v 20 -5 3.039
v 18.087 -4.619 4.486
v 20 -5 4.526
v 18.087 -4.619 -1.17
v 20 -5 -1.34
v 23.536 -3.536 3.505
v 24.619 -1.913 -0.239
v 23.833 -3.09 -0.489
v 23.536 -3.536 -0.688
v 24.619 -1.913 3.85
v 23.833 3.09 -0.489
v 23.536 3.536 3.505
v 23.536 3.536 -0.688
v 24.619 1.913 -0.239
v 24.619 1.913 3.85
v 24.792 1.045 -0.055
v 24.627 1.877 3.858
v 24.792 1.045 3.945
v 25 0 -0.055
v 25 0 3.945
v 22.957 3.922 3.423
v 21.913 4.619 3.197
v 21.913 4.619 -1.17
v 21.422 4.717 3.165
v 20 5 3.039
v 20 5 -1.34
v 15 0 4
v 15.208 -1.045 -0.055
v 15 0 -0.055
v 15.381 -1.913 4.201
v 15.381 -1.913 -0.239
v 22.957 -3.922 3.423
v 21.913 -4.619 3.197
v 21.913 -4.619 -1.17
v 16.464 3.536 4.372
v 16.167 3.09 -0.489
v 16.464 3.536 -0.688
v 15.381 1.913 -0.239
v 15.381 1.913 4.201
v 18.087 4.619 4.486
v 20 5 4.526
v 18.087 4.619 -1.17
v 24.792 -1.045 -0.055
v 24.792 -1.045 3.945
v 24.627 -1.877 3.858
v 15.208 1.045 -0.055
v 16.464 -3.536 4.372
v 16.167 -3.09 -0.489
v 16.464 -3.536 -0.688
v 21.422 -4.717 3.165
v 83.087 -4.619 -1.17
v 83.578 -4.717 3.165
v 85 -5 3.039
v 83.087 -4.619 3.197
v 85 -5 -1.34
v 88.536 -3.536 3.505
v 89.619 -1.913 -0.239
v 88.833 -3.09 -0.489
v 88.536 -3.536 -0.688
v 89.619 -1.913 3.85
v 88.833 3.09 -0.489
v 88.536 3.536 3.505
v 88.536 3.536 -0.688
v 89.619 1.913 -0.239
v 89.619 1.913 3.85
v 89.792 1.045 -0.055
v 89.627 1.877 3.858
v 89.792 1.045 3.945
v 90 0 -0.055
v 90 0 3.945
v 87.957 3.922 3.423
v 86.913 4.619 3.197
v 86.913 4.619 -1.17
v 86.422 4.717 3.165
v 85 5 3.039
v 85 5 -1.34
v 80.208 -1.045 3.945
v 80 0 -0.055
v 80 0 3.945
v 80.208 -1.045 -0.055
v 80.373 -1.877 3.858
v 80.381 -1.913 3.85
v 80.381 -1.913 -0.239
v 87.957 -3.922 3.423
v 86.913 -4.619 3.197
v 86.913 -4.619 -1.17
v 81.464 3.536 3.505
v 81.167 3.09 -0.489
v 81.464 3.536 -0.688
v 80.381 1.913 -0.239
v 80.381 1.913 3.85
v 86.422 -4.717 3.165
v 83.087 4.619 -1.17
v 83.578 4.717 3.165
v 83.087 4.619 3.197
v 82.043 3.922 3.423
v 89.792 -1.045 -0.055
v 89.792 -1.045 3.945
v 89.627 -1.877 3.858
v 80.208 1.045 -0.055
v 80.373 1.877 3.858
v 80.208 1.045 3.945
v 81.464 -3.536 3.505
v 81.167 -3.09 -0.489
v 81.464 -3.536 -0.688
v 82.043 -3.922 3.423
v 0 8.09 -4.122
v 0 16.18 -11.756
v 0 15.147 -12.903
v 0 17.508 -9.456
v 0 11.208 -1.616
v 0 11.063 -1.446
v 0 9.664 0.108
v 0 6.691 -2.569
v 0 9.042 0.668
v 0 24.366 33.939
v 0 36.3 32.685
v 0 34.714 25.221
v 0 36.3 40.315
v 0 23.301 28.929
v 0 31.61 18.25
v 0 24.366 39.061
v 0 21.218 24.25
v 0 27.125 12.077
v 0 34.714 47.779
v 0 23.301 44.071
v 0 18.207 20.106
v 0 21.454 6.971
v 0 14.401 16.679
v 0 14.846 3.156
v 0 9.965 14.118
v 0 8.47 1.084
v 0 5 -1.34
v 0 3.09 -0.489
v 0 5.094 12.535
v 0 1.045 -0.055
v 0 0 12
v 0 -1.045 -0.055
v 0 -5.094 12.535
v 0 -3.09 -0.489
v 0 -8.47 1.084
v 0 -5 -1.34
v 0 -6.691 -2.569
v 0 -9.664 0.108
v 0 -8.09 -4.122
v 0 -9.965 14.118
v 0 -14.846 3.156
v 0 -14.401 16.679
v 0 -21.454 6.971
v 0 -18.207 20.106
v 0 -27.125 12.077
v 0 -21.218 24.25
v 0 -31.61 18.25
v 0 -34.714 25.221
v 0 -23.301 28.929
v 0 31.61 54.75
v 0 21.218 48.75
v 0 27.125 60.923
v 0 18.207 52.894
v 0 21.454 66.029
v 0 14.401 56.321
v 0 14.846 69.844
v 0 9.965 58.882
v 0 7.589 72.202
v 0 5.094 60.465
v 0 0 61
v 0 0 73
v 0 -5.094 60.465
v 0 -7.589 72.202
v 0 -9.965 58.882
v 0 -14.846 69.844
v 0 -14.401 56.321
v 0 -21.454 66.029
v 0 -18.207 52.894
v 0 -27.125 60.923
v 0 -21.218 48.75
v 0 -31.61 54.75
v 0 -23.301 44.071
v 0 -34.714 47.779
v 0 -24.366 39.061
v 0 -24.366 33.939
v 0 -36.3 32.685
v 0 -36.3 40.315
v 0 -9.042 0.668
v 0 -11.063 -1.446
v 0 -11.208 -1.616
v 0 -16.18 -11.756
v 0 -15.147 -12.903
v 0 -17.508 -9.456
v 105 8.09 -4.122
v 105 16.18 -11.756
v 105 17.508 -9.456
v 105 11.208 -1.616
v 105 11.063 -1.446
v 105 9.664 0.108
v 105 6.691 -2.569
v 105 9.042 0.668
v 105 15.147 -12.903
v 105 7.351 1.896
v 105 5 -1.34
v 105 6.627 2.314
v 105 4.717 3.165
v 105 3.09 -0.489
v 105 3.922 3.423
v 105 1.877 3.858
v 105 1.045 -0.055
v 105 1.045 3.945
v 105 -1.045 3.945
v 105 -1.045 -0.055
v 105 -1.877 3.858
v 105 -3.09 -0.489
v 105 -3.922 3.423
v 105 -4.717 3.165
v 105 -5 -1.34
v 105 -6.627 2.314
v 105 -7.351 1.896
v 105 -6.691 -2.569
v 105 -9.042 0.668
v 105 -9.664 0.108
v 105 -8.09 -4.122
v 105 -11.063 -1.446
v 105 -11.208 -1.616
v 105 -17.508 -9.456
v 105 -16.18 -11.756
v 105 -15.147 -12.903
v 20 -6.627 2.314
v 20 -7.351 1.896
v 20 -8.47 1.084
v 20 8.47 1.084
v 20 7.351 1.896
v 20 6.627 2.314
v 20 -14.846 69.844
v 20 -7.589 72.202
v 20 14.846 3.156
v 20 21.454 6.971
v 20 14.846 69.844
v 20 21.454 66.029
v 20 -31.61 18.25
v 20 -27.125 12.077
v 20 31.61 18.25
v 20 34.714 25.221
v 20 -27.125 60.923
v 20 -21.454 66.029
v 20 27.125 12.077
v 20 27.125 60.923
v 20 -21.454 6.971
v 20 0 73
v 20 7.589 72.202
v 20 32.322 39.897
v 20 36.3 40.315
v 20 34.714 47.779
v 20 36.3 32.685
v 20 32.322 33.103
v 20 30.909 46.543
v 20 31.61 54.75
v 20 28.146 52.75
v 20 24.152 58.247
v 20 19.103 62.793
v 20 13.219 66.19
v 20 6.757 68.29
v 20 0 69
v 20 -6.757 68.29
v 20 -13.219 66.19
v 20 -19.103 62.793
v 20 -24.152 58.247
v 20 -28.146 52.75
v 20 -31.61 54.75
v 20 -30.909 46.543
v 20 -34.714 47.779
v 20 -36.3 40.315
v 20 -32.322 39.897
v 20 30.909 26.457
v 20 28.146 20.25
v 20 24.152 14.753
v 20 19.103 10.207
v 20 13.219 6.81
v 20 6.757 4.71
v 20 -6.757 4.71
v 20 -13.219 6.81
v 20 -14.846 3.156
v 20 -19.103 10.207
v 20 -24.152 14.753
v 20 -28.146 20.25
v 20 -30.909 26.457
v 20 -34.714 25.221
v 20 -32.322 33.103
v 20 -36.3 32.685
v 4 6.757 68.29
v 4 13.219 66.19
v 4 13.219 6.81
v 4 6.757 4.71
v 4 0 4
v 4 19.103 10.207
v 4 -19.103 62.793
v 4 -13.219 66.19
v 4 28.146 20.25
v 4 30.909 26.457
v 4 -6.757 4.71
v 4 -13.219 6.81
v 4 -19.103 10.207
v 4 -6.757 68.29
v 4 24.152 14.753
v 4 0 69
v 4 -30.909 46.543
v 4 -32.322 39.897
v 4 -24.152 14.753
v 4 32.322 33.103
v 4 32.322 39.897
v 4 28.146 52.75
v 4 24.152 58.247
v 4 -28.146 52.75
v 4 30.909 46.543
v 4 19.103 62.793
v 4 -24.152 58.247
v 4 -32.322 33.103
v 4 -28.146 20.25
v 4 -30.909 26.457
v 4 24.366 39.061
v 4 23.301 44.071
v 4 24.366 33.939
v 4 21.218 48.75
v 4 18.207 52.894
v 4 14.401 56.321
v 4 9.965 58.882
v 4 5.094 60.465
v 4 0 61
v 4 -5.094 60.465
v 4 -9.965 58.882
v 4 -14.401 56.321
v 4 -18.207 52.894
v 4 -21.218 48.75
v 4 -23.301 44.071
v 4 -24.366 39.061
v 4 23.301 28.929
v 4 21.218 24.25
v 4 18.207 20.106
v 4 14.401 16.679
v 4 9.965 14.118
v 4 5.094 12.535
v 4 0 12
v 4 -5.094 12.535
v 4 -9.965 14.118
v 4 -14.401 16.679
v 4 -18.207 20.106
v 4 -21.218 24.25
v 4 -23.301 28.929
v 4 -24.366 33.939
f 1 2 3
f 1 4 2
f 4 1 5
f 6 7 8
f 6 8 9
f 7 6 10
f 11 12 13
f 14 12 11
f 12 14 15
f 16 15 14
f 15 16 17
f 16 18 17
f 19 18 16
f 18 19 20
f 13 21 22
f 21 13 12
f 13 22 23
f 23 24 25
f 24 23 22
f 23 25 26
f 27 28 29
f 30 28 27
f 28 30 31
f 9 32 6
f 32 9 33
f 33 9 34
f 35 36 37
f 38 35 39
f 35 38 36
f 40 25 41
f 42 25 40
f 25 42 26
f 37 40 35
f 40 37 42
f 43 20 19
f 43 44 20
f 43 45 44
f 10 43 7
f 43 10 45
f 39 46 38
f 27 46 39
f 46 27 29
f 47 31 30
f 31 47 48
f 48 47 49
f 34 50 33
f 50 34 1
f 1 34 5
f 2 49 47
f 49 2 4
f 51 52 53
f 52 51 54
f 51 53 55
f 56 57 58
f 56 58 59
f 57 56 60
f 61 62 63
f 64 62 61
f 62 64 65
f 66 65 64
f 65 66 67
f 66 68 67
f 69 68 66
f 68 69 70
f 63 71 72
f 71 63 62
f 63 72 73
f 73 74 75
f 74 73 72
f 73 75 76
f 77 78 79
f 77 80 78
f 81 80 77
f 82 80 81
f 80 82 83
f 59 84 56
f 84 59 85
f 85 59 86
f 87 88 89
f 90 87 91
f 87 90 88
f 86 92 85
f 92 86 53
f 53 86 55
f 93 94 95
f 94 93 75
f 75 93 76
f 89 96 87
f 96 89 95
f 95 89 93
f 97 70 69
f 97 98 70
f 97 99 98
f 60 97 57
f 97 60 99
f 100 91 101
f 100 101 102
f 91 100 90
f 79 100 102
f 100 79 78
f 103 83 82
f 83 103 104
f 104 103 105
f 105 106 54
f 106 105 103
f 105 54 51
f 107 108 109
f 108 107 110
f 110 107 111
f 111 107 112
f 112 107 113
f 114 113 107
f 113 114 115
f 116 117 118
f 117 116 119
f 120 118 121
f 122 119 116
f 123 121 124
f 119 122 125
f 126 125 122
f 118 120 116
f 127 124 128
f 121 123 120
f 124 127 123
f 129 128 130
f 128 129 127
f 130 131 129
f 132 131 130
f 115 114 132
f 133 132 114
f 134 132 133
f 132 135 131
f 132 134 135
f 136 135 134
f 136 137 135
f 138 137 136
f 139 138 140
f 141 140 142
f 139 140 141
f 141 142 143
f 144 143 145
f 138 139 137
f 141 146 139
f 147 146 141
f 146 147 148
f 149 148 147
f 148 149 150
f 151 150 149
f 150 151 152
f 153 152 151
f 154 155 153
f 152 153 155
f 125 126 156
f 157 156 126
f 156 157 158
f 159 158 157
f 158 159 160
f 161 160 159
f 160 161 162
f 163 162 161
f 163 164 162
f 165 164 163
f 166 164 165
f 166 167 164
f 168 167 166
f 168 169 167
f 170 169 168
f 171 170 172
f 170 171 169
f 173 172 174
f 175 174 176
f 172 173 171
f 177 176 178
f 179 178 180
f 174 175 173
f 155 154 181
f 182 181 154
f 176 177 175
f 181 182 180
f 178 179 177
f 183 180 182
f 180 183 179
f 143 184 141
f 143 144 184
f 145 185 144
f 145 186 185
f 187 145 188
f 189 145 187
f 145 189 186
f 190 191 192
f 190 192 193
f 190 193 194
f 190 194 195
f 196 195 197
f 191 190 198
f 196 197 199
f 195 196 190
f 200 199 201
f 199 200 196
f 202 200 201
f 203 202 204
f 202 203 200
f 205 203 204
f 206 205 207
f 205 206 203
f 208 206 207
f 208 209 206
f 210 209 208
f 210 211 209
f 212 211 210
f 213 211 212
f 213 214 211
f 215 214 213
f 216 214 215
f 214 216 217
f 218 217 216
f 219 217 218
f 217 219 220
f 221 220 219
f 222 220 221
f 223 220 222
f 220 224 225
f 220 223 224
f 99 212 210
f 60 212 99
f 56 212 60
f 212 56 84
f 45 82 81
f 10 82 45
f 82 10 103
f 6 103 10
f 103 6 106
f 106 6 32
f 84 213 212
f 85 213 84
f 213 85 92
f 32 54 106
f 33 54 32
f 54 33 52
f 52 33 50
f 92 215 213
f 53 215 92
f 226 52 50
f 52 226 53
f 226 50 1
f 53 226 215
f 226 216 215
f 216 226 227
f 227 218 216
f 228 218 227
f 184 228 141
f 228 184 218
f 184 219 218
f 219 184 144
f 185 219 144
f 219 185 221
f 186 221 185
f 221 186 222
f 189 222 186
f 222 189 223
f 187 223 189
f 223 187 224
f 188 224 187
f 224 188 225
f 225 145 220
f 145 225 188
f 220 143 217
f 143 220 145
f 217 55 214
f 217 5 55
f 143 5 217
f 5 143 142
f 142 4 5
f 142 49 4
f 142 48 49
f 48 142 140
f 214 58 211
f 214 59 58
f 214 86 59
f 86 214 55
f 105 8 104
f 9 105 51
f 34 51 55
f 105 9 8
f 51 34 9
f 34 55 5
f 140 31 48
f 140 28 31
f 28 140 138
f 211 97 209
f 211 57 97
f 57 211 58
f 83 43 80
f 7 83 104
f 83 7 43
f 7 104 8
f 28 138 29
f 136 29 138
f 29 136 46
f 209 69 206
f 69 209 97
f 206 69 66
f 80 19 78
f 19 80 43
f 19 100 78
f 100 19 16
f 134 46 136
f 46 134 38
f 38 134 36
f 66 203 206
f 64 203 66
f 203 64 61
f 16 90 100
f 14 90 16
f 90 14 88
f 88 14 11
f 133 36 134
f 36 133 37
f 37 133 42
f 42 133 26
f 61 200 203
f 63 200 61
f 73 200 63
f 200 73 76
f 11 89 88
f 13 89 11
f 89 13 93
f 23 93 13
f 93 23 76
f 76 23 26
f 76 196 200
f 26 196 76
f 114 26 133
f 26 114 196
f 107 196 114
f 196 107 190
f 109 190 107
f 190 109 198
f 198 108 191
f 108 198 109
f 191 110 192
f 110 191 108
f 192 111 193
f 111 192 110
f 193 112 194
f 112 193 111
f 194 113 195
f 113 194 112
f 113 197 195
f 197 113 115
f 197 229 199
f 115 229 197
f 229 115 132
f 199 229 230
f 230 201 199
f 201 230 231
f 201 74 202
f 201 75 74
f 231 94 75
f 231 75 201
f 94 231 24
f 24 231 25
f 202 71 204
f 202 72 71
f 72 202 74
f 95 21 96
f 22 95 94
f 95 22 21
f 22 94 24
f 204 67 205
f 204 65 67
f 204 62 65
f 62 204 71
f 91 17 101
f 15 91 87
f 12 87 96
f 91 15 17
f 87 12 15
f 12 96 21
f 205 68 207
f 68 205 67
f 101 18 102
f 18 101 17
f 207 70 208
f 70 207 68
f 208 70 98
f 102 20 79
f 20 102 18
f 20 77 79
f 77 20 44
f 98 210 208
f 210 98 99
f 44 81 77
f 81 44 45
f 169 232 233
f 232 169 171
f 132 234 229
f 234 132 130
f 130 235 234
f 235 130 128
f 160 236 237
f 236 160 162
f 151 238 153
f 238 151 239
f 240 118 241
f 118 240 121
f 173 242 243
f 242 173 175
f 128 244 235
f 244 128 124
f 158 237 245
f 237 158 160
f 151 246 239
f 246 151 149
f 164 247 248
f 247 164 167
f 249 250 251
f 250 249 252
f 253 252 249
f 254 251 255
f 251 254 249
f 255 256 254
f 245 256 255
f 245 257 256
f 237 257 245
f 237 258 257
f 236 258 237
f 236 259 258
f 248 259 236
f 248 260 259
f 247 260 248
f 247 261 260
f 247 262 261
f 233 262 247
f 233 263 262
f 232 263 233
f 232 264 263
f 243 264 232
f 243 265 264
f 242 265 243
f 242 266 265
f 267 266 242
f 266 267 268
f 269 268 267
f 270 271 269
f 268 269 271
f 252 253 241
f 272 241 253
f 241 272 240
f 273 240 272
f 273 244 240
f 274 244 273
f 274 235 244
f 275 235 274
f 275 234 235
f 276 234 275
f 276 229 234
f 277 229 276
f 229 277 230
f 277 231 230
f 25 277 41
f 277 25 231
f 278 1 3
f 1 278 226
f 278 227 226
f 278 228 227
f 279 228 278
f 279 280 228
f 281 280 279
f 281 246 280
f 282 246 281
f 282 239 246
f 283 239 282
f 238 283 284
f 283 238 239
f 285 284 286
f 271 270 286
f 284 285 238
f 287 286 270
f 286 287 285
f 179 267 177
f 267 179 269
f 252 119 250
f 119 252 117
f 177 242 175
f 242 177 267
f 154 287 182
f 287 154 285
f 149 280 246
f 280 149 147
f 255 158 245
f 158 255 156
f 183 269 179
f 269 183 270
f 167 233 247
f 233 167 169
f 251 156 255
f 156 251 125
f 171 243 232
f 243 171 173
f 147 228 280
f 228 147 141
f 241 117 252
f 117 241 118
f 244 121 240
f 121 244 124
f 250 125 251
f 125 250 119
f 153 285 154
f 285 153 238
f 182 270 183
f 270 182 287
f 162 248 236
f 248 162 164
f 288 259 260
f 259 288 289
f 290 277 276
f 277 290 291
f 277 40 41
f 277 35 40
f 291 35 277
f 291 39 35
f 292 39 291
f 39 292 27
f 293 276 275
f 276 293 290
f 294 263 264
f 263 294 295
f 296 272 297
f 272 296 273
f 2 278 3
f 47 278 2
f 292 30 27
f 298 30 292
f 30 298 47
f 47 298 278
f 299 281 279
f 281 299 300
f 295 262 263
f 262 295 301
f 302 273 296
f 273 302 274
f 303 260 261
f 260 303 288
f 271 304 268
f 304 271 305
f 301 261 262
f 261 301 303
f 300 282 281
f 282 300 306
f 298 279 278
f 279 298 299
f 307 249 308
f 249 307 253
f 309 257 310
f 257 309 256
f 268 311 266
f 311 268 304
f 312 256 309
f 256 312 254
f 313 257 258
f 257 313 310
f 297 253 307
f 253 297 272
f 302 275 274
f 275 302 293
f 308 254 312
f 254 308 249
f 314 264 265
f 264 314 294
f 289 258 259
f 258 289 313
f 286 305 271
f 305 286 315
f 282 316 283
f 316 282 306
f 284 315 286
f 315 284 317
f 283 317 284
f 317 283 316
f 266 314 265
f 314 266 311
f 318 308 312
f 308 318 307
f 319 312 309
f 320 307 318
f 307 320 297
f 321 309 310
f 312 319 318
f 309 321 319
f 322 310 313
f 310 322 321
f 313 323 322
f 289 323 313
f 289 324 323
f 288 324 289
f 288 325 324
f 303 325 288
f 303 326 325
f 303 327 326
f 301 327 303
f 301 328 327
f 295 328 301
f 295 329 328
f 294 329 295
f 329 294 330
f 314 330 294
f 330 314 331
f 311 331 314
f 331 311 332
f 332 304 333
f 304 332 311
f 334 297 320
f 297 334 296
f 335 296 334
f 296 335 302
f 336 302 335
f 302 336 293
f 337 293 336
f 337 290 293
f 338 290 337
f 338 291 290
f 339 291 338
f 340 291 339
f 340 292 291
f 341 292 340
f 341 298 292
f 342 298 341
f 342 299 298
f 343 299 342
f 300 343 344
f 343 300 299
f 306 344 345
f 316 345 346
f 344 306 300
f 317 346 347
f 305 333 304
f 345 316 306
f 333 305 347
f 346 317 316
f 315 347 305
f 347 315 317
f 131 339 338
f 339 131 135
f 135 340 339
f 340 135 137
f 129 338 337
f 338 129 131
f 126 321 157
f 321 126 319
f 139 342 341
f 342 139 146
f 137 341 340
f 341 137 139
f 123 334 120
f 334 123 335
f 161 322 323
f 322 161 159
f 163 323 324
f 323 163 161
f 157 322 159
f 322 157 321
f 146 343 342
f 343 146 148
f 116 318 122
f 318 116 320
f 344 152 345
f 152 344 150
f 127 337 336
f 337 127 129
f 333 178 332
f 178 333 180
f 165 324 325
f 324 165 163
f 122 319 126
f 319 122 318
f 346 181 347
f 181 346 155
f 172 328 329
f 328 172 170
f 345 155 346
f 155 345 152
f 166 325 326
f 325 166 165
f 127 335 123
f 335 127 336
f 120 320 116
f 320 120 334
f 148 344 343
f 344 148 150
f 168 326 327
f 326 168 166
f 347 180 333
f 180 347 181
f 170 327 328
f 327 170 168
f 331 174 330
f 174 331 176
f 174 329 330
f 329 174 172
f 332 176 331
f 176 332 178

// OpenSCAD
dSchroef        = 6;  // bouten waar bidon mee vast zig
dGat            = 10; // lasstuk op framebuis 
bOnder          = 41; // breedste deel van de buis
l               = 41; // vanaf schroef tot breedste deel buis
schroefAfstand  = 65; // Afstand tussen bevestigings schroeven
verlenging      = 20; // bepaald de lengte van de bidonhouder
dFrameBuis      = 35; // doorsnede framebuis / zadel
wall            = 4;  // dikte van de wanden
d               = 20; // afronding van houder

//
dFles = 65;
dSmall = 51;


//////////// Calculated ///////////////////
holes = [[verlenging                 , 0, 0]
       , [verlenging + schroefAfstand, 0, 0]];


bevestiging();
flesHouder();


module flesHouder() {

    flesVoet();

}

module flesVoet() {
    hVoet = verlenging;
    difference() {
        up(dFles / 2 + wall)
        rotate([0, 90, 0])
        difference() {
            cylinder(d=dFles + 2 * wall, h=hVoet);
            up(wall)  cylinder(d=dFles, h=hVoet);
            up(-wall) cylinder(d=dFles - 4 * wall, h=hVoet * 2);
        }
        holes();
    }
    

}

module bevestiging() {
    difference() {
        frameMount();
        holes();
    }
}

module holes() {
    for(i=holes) {
        translate(i)
            cylinder(d = dGat, h = 10, center = true);
    }
}

module frameMount() {
    steun = 20;
    
    rotate([270,0,0])
    rotate([0, 90, 0]) 
    linear_extrude(height  = schroefAfstand + verlenging * 2)
    difference() {
        bevestiging2d(wall);
        bevestiging2d(0);
        difference() {
            circle(d=steun * 10);
            circle(d=steun * 2);
        }
    }
    
}

module bevestiging2d(wall = 0) {
    x = bOnder / 2;
    pos = [[ 0, d / 2, 0]
         , [-x, y()    , 0]
         , [ x, y()    , 0]];

    offset(wall)
        hull() {
            for(i=pos) {
                translate(i)
                    circle(d=d);
            }
        }

}

module up(h = 0) {translate([0, 0, h]) children();}

// bereken de y aan de hand van buidBreedte en lengte van vlak
function hoek() = asin((bOnder / 2) / l);
function y() = l * cos(hoek());
